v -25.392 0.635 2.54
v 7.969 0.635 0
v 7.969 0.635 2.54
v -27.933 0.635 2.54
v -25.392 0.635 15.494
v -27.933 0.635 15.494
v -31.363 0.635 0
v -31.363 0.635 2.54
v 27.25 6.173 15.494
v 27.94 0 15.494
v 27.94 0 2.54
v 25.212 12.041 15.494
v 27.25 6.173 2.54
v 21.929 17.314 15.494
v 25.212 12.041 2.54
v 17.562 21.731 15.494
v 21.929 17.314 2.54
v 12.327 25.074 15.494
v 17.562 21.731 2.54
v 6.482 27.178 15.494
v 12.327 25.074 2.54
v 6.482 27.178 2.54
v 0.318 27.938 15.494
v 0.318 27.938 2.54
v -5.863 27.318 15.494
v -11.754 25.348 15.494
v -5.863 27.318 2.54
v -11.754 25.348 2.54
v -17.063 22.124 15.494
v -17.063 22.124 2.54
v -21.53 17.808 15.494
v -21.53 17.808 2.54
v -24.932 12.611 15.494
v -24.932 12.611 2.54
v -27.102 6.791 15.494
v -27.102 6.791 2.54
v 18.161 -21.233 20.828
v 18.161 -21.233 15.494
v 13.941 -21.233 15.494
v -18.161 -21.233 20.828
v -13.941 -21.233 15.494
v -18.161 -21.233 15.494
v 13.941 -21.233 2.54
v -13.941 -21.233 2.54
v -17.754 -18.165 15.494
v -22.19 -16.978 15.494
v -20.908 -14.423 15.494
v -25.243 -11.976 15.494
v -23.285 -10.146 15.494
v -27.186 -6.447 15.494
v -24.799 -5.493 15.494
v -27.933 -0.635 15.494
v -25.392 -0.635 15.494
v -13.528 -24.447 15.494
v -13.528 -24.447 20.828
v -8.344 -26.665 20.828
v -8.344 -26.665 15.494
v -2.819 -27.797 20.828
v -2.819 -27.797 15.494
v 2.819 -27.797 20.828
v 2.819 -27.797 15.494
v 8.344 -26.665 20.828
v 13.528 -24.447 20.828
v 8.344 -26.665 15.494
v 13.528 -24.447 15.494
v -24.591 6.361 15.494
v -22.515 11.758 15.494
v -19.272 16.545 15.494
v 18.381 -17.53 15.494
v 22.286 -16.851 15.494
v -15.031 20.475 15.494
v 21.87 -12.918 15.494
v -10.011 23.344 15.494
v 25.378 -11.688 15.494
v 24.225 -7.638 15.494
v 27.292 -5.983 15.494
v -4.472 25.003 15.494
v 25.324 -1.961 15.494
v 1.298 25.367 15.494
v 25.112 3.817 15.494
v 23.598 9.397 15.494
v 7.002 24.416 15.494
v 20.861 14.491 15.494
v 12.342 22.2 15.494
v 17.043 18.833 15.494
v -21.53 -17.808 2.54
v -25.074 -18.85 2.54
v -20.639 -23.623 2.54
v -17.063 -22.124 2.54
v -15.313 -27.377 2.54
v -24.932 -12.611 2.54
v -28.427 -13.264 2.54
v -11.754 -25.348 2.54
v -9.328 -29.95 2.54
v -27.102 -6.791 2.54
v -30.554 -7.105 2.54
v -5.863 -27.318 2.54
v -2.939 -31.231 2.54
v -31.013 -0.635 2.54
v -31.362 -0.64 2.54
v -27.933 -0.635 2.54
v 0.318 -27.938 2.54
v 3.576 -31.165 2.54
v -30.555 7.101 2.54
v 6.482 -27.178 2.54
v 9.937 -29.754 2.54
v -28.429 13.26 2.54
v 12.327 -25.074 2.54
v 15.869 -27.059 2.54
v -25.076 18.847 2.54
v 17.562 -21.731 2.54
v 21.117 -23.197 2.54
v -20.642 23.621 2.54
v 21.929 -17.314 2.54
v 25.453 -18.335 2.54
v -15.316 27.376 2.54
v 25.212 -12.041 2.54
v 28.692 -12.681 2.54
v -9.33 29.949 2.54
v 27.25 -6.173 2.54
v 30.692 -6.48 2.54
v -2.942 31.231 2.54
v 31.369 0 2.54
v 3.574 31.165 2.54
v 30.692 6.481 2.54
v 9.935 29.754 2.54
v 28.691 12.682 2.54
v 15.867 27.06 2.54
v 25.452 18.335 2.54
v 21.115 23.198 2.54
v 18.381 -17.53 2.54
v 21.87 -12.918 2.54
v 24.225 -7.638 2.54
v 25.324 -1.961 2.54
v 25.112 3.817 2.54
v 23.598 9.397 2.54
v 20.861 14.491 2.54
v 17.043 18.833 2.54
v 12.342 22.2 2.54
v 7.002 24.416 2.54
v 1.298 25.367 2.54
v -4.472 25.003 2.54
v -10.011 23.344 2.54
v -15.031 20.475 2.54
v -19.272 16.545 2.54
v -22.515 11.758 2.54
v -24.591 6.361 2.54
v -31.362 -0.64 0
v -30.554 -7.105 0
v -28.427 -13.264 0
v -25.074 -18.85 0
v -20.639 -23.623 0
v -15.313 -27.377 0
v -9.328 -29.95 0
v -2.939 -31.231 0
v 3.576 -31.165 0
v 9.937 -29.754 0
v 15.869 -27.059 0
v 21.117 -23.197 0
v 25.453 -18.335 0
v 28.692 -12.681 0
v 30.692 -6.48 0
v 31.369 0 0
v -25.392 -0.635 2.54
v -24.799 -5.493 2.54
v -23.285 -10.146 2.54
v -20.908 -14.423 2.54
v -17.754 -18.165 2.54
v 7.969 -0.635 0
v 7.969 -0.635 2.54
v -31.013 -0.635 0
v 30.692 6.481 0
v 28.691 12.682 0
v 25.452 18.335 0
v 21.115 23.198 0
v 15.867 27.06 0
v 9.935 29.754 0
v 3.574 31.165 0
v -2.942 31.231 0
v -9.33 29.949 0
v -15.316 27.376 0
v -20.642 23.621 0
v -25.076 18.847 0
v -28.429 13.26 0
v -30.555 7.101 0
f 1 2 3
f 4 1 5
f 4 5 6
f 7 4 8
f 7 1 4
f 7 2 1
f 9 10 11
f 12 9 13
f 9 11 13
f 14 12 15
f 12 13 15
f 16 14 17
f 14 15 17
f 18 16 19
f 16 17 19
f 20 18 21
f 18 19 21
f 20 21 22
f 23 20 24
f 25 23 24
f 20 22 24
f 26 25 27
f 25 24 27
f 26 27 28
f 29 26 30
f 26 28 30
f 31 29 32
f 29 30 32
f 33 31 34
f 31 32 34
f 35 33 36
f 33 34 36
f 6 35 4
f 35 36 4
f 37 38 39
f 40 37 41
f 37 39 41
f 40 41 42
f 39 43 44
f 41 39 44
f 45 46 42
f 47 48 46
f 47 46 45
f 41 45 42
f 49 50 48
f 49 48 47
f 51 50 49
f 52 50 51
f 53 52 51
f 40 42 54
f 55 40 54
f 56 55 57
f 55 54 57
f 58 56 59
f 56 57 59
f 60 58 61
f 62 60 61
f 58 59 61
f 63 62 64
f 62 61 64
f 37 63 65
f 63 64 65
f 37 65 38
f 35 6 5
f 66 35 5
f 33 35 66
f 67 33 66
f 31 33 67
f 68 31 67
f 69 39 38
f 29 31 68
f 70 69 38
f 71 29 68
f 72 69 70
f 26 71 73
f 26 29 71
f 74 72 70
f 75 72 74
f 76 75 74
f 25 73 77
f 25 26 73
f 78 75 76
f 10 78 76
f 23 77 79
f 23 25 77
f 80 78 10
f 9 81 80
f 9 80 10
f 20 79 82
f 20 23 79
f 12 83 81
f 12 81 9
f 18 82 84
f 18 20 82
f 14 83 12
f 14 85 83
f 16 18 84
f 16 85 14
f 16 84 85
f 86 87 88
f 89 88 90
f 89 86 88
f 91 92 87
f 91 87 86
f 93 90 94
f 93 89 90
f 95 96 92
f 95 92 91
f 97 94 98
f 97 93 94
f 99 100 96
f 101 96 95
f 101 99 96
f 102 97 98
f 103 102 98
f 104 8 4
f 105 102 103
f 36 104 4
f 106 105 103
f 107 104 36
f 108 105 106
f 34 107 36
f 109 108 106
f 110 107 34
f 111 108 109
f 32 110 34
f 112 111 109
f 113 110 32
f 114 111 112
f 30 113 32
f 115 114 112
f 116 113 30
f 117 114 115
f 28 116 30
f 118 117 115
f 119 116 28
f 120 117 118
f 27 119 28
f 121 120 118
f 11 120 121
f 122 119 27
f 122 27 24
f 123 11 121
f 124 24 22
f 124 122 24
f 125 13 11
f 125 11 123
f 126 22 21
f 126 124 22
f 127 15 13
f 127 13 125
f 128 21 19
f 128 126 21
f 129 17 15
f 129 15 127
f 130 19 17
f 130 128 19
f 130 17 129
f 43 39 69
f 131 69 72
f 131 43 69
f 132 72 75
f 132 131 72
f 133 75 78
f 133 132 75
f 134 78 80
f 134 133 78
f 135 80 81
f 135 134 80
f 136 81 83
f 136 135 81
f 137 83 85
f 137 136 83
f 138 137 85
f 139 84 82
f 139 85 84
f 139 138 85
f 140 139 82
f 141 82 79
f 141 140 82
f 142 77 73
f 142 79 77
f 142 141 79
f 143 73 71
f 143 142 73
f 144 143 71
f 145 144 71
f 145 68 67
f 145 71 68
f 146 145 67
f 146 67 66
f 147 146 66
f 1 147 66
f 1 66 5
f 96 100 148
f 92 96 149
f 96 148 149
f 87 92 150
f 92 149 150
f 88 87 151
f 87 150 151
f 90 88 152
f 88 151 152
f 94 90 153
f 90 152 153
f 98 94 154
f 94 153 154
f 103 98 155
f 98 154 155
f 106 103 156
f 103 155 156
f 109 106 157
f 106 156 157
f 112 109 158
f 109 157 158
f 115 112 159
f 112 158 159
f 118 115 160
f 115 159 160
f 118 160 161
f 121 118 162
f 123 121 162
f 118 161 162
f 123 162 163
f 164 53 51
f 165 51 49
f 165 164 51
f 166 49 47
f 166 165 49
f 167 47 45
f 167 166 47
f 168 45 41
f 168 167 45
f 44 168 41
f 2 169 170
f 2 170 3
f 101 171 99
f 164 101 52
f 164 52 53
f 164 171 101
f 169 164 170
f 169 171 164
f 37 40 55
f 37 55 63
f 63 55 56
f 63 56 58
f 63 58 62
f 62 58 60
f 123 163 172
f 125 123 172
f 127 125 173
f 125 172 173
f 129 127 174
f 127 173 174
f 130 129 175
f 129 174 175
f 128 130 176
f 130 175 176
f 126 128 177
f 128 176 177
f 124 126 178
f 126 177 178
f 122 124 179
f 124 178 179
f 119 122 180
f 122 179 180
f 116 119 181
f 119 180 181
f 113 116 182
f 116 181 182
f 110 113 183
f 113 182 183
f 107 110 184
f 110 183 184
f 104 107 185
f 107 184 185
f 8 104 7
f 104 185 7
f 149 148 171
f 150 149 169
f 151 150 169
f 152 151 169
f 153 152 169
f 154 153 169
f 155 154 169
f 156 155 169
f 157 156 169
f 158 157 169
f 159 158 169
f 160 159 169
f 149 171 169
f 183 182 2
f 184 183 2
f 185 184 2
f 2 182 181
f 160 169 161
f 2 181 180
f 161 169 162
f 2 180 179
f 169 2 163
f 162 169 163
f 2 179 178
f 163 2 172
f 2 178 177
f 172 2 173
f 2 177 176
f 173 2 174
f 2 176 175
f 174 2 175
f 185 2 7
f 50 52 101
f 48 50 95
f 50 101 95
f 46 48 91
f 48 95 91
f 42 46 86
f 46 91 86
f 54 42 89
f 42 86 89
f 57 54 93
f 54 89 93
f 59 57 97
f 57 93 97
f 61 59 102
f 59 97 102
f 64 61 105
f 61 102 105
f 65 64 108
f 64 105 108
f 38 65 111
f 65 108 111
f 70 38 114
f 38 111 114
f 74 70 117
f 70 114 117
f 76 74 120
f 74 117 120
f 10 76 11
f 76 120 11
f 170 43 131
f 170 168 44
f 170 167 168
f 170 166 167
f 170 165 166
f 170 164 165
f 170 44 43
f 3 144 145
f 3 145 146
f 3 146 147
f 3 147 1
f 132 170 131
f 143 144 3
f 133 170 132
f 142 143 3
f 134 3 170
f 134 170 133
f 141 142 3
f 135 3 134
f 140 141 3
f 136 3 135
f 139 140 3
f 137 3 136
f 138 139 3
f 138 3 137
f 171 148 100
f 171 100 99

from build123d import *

# Parameters (mm, degrees)
F0_R     = 31.369
F1_DEPTH = 2.54
F2_R     = 27.94
F2_R_2   = 25.4
F3_DEPTH = 15.494
F5_DEPTH = 25.4
F7_DEPTH = 20.828


with BuildPart() as f1:
    # F0 (on Top) → F1 (new body)
    with BuildSketch(Plane.XY):
        Circle(F0_R)
    extrude(amount=F1_DEPTH)

    # F2 (on Top) → F3 (join)
    with BuildSketch(Plane.XY):
        Circle(F2_R)
        Circle(F2_R_2, mode=Mode.SUBTRACT)
    extrude(amount=F3_DEPTH)

    # F4 (on face) → F5 (cut)
    with BuildSketch(Plane.XY):
        with BuildLine():
            Line((0, -0.635), (0, 0))
            Line((0, 0), (0, 0.635))
            Line((0, 0.635), (-31.330898, 0.635))
            Line((-31.330898, 0.635), (-31.362572, 0.635))
            ThreePointArc((-31.362572, 0.635), (-31.369, -0.002537), (-31.362469, -0.640074))
            Line((-31.362469, -0.640074), (-31.013001, -0.635))
            Line((-31.013001, -0.635), (0, -0.635))
        make_face()
        with BuildLine():
            Line((-31.979989, -0.649039), (-31.362469, -0.640074))
            ThreePointArc((-31.362469, -0.640074), (-31.369, -0.002537), (-31.362572, 0.635))
            Line((-31.362572, 0.635), (-31.979989, 0.635))
            Line((-31.979989, 0.635), (-31.979989, -0.649039))
        make_face()
        Polygon((0, 0.635), (0, 0), (0, -0.635), (7.969206, -0.635), (7.969206, 0.635), (4.666724, 0.635), align=None)
    extrude(amount=F5_DEPTH, mode=Mode.SUBTRACT)

    # F6 (on Top) → F7 (join)
    with BuildSketch(Plane.XY):
        with BuildLine():
            Line((18.161, -21.232562), (-18.161, -21.232562))
            ThreePointArc((-18.161, -21.232562), (0, -27.94), (18.161, -21.232562))
        make_face()
    extrude(amount=F7_DEPTH)


solid = f1.part
